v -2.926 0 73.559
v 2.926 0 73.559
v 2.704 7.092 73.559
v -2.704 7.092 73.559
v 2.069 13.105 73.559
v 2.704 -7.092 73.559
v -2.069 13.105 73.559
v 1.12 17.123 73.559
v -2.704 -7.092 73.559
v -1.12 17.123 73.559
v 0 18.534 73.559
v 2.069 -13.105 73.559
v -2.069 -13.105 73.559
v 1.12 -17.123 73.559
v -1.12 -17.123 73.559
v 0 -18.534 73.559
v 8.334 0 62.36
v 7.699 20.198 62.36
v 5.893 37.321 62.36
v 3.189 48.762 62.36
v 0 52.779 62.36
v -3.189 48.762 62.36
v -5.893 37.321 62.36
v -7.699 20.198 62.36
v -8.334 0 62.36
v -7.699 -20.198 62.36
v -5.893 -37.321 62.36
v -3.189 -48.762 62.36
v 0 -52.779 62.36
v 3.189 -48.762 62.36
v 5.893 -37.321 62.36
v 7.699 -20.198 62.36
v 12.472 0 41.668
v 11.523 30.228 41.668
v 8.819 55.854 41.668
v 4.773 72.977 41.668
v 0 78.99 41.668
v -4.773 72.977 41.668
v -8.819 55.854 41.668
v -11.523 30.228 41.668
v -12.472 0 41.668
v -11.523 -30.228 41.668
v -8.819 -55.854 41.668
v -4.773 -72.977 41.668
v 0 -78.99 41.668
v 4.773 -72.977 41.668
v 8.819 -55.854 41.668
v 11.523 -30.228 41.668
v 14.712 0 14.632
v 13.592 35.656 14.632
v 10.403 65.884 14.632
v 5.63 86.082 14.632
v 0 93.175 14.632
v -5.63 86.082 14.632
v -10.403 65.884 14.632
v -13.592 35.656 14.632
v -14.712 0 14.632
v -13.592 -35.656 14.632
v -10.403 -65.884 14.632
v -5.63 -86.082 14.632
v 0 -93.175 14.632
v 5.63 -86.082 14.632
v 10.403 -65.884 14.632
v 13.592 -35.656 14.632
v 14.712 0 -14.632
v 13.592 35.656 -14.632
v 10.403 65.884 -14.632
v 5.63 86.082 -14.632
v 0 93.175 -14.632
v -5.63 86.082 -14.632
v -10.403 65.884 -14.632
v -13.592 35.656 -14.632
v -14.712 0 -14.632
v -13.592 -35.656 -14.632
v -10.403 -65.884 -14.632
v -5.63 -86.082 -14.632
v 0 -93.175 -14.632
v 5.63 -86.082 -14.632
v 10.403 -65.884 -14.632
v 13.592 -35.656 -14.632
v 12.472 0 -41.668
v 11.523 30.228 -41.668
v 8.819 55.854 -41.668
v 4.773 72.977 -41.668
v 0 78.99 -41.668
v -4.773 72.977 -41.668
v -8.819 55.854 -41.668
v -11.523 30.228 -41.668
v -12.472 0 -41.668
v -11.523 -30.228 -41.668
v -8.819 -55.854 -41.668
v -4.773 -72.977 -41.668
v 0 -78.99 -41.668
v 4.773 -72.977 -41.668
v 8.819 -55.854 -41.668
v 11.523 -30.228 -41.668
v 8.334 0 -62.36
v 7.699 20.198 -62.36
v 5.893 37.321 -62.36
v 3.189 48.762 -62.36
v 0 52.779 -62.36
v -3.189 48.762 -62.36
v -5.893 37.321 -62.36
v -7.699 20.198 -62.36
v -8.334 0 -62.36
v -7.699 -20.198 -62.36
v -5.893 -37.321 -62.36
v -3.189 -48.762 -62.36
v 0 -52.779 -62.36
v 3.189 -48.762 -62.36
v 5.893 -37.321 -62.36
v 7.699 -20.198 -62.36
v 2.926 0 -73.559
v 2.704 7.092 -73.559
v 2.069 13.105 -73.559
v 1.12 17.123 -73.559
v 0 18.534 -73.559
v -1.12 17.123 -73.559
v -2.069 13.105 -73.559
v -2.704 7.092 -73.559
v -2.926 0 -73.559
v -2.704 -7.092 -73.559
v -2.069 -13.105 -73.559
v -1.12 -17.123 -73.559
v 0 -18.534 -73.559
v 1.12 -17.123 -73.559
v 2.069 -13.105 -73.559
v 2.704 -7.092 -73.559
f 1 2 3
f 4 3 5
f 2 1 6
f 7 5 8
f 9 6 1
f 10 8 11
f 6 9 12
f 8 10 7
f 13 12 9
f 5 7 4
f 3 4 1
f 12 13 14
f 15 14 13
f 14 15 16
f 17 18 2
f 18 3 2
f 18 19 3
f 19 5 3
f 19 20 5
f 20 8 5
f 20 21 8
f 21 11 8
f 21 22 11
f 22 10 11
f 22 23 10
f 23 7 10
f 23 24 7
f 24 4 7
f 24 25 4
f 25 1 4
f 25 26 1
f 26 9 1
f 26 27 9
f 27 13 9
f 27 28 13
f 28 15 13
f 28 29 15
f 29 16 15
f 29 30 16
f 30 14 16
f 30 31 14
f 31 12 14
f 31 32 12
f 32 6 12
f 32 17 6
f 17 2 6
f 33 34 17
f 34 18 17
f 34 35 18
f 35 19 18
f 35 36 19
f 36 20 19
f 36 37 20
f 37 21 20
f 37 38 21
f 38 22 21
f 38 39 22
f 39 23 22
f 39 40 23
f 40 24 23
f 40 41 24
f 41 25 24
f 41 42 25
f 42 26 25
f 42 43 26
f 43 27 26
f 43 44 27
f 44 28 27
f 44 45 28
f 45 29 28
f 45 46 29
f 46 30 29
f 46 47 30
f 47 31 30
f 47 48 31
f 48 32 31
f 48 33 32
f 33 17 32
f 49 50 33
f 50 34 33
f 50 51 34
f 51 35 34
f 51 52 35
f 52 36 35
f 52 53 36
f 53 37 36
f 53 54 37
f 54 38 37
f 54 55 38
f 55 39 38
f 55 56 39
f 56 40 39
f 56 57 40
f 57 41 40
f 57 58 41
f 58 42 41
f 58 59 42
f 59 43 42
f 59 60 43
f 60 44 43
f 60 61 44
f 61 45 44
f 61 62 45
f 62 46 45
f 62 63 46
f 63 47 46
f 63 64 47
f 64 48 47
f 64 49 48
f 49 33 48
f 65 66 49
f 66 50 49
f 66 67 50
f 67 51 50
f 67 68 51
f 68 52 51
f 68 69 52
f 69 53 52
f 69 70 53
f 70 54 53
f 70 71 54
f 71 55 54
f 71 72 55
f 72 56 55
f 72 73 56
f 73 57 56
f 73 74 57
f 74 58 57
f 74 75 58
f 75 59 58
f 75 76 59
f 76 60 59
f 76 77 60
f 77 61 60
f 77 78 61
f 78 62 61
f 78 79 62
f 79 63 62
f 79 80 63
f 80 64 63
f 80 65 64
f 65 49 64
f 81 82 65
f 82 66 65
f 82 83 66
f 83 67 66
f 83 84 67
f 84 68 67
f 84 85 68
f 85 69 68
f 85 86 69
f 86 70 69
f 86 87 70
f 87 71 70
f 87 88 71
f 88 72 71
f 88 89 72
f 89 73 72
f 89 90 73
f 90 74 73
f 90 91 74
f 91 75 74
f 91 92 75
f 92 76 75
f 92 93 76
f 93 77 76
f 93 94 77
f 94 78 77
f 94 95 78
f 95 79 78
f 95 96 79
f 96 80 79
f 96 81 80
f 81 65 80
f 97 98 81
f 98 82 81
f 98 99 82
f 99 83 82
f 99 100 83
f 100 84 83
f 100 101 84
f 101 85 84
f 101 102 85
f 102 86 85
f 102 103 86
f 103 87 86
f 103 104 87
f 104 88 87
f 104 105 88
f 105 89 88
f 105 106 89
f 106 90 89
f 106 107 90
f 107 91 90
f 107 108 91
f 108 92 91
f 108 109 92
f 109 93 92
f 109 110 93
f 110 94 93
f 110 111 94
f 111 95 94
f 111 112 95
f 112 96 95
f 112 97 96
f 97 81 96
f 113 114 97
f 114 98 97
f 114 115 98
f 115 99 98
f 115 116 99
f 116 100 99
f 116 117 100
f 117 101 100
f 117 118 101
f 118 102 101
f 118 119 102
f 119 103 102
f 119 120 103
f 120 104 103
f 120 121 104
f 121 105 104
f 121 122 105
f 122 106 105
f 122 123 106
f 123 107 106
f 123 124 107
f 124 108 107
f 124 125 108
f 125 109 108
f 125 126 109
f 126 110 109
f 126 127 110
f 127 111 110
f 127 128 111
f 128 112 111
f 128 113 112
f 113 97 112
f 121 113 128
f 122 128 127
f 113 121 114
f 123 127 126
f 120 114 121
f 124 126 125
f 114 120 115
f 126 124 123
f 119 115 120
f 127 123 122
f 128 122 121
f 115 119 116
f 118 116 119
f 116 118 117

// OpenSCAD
// Generated by SolidPython 1.0.1 on 2020-07-29 00:46:46


scale(v = [3, 19, 15]) {
	sphere(r = 5);
}
/***********************************************
*********      SolidPython code:      **********
************************************************
 
# import packages: SolidPython
from solid import *
from solid.utils import *
from itertools import chain, combinations, permutations


class Resize:

    def __init__(self, scad_file):
        self.scad_file = scad_file
        #self.scad_file = import_scad(scad_file)
        # cone/cylinder param:
        self.r1 = 0
        self.r2 = 0
        self.h = 0
        # rectangular prism param:
        self.w = 0
        self.l = 0
        # ellipse param:
        self.r = 0

    # import OpenScad code (file name corresponds to shape)


    # classify shape + parameters
    def assign(self, param1, param2, param3):
        if self.scad_file == 'cone.scad':
            self.r1 = param1
            self.r2 = param2
            self.h = param3
        elif self.scad_file == 'cylinder.scad':
            self.r1 = param1
            self.r2 = param2
            self.h = param3
        elif self.scad_file == 'rectangularPrism.scad':
            self.h = param1
            self.l = param2
            self.w = param3
        else:
            self.r = param1
            self.h = param2

    # resize parameters
    def iterate(self):
        x = range(3, 20, 2)
        i = 1
        if self.scad_file == 'cone.scad':
            tempList = list(permutations(x, 2))
            for temp in tempList:
                param1 = temp[0]
                param2 = temp[1]
                filepath = 'produced_scad_files/' + 'cone' + str(param1) + '_' + str(param2) + '_' + '.scad'
                scad_render_to_file(cylinder(h=param1, r1=param2, r2=0), filepath)

        elif self.scad_file == 'cylinder.scad':
            tempList = list(permutations(x, 3))
            for temp in tempList:
                param1 = temp[0]
                param2 = temp[1]
                filepath = 'produced_scad_files/' + 'cylinder' + str(param1) + '_' + str(param2) + '_' + '.scad'
                scad_render_to_file(cylinder(h=param1, r1=param2, r2=param2), filepath)

        elif self.scad_file == 'rectangularPrism.scad':
            tempList = list(permutations(x, 3))
            for temp in tempList:
                param1 = temp[0]
                param2 = temp[1]
                param3 = temp[2]
                filepath = 'produced_scad_files/' + 'rectangularPrism' + str(param1) + '_' + str(param2) + '_' + str(
                    param3) + '.scad'
                scad_render_to_file(cube(size=(param1, param2, param3)), filepath)

        elif self.scad_file == 'ellipse.scad':
            tempList = list(permutations(x, 4))
            for temp in tempList:
                param1 = temp[0]
                param2 = temp[1]
                param3 = temp[2]
                param4 = temp[3]
                filepath = 'produced_scad_files/' + 'ellipse' + str(param1) + '_' + str(param2) + '_' + str(param3) + '_' + str(param4) + '.scad'
                scad_render_to_file(scale([param1, param2, param3])(sphere(r=param4)), filepath)

    def render_to_scadfile(self):
        scad_render_to_file(scad, 'example.scad') 
 
************************************************/
